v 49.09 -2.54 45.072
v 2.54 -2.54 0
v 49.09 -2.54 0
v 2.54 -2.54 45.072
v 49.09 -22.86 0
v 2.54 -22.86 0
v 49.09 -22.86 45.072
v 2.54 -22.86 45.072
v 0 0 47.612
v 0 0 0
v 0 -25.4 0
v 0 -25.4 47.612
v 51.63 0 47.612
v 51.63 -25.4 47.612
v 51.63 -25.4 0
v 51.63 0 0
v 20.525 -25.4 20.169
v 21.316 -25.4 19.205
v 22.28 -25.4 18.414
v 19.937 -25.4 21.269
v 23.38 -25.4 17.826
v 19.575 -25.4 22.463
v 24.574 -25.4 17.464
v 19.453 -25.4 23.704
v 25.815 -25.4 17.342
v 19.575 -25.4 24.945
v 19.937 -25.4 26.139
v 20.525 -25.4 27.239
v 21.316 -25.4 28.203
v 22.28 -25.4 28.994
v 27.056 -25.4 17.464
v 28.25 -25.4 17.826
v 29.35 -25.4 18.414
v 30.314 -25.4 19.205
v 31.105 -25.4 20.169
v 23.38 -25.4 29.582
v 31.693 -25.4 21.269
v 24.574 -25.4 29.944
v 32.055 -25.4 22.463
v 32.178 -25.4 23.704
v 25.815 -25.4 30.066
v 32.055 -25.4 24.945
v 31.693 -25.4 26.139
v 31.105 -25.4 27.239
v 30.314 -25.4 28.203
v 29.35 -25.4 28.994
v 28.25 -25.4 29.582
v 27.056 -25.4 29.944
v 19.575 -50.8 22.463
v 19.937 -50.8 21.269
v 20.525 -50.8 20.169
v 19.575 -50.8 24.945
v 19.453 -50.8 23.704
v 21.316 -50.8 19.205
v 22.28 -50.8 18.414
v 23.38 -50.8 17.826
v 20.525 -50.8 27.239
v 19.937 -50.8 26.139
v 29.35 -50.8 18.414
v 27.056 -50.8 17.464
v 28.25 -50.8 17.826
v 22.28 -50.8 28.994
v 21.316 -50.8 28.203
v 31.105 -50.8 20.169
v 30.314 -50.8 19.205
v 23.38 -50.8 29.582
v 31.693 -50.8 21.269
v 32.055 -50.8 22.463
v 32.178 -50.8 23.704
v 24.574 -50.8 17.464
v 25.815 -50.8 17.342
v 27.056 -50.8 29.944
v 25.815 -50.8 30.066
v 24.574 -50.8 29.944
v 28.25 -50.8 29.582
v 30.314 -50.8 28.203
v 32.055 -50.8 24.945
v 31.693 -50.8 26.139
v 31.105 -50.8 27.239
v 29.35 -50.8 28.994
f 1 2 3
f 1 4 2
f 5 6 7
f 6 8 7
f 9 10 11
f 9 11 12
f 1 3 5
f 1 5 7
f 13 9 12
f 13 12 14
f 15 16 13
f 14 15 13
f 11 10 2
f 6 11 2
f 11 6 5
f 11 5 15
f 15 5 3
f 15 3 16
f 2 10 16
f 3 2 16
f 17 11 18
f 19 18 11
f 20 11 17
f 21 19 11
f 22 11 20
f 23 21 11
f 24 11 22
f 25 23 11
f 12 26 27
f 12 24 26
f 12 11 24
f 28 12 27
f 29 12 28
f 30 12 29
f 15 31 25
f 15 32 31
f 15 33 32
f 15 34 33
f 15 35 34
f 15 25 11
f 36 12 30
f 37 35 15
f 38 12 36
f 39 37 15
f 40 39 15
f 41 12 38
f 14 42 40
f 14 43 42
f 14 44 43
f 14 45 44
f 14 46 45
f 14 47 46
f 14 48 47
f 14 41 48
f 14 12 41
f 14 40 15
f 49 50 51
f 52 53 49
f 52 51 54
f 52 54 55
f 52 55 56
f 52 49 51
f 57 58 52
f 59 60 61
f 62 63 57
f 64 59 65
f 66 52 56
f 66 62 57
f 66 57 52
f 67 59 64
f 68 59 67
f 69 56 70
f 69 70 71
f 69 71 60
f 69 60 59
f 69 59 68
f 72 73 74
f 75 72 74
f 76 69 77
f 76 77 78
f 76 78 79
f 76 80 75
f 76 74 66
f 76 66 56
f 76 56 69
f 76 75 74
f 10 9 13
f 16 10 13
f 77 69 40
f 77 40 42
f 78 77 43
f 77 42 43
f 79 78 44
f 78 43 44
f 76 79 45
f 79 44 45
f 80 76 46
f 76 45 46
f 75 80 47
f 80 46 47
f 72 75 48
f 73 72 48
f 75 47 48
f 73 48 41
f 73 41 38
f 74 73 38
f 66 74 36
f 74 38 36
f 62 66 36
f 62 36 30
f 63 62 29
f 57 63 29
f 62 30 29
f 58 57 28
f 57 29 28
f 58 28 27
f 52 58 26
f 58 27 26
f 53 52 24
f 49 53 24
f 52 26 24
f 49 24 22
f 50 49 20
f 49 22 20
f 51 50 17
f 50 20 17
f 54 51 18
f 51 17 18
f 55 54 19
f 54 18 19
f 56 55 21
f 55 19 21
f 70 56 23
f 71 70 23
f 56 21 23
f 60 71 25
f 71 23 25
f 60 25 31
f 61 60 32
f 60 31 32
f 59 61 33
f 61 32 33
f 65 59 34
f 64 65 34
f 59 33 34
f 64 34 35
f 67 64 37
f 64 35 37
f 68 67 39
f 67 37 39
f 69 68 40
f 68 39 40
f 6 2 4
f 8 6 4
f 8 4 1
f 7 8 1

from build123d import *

# Parameters (mm, degrees)
F0_W     = 51.630139
F0_H     = 47.6119
F1_DEPTH = 25.4
F2_T     = -127
F3_T     = -2.54
F4_R     = 6.362452
F5_DEPTH = 25.4


with BuildPart() as f1:
    # F0 (on Front) → F1 (new body)
    with BuildSketch(Plane.XZ):
        with Locations((25.815069, 23.80595)):
            Rectangle(F0_W, F0_H)
    extrude(amount=F1_DEPTH)

    # F2
    f2_openings = [f1.faces().sort_by_distance(p)[0] for p in [
        (0, -12.7, 23.80595),
    ]]
    offset(amount=F2_T, openings=f2_openings)

    # F3
    f3_openings = [f1.faces().sort_by_distance(p)[0] for p in [
        (25.81507, -12.7, 0),
    ]]
    offset(amount=F3_T, openings=f3_openings)

    # F4 (on face) → F5 (join)
    with BuildSketch(Plane.XZ.offset(25.4)):
        with Locations((25.81507, 23.704037)):
            Circle(F4_R)
    extrude(amount=F5_DEPTH)


solid = f1.part
